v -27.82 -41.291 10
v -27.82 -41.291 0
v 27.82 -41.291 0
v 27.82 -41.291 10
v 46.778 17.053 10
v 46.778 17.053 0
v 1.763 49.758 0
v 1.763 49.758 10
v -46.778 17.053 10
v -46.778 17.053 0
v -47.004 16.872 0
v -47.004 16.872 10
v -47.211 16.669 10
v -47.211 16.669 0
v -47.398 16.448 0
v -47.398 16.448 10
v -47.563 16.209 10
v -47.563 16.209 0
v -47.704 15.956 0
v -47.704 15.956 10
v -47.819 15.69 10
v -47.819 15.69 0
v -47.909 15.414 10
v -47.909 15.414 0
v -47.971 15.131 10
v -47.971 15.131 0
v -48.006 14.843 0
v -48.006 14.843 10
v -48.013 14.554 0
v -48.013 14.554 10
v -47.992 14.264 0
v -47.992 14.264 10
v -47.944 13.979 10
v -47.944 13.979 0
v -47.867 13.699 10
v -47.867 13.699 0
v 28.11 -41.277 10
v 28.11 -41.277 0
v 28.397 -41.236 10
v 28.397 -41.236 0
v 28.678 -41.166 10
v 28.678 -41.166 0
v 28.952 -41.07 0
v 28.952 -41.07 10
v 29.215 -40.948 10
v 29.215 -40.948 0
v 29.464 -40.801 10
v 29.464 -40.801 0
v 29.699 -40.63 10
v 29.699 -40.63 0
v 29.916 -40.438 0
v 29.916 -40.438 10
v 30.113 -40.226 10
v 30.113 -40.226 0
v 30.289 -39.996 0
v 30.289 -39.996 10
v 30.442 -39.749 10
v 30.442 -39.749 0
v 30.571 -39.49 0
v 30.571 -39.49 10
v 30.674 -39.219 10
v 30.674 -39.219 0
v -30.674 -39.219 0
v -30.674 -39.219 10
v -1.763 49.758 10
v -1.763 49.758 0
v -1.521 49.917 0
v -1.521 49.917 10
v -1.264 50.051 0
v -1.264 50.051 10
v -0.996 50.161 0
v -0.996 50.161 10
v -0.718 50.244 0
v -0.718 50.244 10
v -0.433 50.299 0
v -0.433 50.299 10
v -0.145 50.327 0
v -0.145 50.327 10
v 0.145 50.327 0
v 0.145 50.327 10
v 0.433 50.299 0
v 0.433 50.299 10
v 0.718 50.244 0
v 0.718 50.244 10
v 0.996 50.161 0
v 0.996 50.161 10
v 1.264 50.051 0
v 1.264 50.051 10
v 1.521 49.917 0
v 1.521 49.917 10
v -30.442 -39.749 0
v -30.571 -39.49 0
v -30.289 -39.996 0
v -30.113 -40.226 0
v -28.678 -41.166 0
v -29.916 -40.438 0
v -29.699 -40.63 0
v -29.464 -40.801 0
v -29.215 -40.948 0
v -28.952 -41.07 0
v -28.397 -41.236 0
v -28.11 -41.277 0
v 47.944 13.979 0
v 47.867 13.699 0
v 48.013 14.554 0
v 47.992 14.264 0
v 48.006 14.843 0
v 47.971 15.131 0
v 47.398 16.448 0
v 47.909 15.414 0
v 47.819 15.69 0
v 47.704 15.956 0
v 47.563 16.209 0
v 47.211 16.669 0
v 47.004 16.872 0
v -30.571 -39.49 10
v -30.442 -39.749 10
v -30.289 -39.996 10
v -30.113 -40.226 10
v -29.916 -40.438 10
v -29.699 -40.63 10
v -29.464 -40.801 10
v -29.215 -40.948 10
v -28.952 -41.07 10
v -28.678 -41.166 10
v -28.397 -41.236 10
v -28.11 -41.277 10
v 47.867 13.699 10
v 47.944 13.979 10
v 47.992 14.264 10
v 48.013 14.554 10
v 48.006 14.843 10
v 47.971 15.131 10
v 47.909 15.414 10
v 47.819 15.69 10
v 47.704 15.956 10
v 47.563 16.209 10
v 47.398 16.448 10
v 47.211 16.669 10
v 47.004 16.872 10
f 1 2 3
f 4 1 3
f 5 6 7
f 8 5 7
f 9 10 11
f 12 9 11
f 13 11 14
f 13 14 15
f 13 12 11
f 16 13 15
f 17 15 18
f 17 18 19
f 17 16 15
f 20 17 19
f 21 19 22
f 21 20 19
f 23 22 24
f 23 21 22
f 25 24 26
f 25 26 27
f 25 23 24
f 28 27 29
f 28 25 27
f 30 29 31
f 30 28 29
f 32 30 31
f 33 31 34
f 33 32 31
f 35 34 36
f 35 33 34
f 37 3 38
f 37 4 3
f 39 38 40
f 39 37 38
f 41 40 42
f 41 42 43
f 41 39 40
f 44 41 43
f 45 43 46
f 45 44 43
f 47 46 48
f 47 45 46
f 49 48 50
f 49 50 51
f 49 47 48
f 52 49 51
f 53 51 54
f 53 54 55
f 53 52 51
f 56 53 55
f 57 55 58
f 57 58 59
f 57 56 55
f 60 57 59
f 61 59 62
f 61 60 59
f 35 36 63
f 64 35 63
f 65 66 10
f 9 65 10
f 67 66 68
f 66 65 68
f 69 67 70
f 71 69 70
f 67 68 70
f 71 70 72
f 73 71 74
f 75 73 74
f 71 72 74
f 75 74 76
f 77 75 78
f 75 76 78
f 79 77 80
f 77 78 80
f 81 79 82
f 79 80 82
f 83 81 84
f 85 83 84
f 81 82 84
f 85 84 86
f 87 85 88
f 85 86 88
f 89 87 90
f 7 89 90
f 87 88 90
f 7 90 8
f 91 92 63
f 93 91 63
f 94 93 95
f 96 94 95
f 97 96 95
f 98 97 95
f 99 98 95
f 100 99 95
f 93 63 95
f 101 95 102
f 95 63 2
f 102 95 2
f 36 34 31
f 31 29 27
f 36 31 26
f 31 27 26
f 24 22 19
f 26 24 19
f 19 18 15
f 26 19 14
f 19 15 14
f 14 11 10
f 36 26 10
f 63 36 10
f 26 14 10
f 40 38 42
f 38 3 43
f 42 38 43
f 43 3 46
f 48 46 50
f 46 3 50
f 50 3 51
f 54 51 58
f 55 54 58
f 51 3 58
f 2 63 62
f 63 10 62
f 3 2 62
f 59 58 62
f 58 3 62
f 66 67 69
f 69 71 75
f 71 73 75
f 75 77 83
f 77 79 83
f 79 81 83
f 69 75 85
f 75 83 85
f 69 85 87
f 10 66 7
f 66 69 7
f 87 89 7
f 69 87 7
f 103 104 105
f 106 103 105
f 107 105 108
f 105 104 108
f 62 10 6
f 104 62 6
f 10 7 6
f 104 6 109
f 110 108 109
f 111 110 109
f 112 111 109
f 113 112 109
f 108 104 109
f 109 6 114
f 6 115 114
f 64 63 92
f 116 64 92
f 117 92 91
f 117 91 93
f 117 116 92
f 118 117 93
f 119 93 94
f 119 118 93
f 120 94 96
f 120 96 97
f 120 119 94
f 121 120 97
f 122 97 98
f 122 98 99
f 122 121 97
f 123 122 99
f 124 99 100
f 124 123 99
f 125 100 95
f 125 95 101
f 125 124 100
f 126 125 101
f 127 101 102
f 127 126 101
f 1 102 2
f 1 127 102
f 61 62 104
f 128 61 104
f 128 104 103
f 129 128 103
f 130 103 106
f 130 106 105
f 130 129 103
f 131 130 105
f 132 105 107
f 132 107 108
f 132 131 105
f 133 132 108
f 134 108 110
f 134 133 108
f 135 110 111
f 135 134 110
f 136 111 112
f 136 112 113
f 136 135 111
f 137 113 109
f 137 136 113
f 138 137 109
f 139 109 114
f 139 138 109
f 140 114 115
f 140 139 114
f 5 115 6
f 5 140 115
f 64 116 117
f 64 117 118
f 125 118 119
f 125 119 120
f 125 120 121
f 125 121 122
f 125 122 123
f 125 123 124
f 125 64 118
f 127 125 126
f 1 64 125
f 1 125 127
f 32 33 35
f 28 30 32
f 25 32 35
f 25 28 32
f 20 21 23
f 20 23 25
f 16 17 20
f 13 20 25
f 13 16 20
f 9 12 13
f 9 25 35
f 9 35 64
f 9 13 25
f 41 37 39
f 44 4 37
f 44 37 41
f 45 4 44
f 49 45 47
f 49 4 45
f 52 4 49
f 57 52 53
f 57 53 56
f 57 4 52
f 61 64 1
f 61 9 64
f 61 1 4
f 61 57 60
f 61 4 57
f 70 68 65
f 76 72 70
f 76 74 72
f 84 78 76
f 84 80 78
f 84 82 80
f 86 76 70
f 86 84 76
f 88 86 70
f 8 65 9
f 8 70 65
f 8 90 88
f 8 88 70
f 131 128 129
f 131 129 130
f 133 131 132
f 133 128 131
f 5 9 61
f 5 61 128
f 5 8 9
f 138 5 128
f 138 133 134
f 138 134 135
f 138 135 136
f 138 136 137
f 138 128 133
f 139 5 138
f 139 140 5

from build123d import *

# Parameters (mm, degrees)
PAD_DEPTH = 10
FILLET_R  = 3


with BuildPart() as part:
    # Sketch → Pad (new body)
    with BuildSketch(Plane.XY):
        Polygon((0, 51.039049), (-48.54102, 15.771933), (-30, -41.291458), (30, -41.291458), (48.54102, 15.771933), align=None)
    extrude(amount=PAD_DEPTH)

    # Fillet
    fillet_edges = [part.edges().sort_by_distance(p)[0] for p in [
        (48.54102, 15.771933, 5),
        (0, 51.039049, 5),
        (-48.54102, 15.771933, 5),
        (-30, -41.291458, 5),
        (30, -41.291458, 5),
    ]]
    fillet(fillet_edges, radius=FILLET_R)


solid = part.part
